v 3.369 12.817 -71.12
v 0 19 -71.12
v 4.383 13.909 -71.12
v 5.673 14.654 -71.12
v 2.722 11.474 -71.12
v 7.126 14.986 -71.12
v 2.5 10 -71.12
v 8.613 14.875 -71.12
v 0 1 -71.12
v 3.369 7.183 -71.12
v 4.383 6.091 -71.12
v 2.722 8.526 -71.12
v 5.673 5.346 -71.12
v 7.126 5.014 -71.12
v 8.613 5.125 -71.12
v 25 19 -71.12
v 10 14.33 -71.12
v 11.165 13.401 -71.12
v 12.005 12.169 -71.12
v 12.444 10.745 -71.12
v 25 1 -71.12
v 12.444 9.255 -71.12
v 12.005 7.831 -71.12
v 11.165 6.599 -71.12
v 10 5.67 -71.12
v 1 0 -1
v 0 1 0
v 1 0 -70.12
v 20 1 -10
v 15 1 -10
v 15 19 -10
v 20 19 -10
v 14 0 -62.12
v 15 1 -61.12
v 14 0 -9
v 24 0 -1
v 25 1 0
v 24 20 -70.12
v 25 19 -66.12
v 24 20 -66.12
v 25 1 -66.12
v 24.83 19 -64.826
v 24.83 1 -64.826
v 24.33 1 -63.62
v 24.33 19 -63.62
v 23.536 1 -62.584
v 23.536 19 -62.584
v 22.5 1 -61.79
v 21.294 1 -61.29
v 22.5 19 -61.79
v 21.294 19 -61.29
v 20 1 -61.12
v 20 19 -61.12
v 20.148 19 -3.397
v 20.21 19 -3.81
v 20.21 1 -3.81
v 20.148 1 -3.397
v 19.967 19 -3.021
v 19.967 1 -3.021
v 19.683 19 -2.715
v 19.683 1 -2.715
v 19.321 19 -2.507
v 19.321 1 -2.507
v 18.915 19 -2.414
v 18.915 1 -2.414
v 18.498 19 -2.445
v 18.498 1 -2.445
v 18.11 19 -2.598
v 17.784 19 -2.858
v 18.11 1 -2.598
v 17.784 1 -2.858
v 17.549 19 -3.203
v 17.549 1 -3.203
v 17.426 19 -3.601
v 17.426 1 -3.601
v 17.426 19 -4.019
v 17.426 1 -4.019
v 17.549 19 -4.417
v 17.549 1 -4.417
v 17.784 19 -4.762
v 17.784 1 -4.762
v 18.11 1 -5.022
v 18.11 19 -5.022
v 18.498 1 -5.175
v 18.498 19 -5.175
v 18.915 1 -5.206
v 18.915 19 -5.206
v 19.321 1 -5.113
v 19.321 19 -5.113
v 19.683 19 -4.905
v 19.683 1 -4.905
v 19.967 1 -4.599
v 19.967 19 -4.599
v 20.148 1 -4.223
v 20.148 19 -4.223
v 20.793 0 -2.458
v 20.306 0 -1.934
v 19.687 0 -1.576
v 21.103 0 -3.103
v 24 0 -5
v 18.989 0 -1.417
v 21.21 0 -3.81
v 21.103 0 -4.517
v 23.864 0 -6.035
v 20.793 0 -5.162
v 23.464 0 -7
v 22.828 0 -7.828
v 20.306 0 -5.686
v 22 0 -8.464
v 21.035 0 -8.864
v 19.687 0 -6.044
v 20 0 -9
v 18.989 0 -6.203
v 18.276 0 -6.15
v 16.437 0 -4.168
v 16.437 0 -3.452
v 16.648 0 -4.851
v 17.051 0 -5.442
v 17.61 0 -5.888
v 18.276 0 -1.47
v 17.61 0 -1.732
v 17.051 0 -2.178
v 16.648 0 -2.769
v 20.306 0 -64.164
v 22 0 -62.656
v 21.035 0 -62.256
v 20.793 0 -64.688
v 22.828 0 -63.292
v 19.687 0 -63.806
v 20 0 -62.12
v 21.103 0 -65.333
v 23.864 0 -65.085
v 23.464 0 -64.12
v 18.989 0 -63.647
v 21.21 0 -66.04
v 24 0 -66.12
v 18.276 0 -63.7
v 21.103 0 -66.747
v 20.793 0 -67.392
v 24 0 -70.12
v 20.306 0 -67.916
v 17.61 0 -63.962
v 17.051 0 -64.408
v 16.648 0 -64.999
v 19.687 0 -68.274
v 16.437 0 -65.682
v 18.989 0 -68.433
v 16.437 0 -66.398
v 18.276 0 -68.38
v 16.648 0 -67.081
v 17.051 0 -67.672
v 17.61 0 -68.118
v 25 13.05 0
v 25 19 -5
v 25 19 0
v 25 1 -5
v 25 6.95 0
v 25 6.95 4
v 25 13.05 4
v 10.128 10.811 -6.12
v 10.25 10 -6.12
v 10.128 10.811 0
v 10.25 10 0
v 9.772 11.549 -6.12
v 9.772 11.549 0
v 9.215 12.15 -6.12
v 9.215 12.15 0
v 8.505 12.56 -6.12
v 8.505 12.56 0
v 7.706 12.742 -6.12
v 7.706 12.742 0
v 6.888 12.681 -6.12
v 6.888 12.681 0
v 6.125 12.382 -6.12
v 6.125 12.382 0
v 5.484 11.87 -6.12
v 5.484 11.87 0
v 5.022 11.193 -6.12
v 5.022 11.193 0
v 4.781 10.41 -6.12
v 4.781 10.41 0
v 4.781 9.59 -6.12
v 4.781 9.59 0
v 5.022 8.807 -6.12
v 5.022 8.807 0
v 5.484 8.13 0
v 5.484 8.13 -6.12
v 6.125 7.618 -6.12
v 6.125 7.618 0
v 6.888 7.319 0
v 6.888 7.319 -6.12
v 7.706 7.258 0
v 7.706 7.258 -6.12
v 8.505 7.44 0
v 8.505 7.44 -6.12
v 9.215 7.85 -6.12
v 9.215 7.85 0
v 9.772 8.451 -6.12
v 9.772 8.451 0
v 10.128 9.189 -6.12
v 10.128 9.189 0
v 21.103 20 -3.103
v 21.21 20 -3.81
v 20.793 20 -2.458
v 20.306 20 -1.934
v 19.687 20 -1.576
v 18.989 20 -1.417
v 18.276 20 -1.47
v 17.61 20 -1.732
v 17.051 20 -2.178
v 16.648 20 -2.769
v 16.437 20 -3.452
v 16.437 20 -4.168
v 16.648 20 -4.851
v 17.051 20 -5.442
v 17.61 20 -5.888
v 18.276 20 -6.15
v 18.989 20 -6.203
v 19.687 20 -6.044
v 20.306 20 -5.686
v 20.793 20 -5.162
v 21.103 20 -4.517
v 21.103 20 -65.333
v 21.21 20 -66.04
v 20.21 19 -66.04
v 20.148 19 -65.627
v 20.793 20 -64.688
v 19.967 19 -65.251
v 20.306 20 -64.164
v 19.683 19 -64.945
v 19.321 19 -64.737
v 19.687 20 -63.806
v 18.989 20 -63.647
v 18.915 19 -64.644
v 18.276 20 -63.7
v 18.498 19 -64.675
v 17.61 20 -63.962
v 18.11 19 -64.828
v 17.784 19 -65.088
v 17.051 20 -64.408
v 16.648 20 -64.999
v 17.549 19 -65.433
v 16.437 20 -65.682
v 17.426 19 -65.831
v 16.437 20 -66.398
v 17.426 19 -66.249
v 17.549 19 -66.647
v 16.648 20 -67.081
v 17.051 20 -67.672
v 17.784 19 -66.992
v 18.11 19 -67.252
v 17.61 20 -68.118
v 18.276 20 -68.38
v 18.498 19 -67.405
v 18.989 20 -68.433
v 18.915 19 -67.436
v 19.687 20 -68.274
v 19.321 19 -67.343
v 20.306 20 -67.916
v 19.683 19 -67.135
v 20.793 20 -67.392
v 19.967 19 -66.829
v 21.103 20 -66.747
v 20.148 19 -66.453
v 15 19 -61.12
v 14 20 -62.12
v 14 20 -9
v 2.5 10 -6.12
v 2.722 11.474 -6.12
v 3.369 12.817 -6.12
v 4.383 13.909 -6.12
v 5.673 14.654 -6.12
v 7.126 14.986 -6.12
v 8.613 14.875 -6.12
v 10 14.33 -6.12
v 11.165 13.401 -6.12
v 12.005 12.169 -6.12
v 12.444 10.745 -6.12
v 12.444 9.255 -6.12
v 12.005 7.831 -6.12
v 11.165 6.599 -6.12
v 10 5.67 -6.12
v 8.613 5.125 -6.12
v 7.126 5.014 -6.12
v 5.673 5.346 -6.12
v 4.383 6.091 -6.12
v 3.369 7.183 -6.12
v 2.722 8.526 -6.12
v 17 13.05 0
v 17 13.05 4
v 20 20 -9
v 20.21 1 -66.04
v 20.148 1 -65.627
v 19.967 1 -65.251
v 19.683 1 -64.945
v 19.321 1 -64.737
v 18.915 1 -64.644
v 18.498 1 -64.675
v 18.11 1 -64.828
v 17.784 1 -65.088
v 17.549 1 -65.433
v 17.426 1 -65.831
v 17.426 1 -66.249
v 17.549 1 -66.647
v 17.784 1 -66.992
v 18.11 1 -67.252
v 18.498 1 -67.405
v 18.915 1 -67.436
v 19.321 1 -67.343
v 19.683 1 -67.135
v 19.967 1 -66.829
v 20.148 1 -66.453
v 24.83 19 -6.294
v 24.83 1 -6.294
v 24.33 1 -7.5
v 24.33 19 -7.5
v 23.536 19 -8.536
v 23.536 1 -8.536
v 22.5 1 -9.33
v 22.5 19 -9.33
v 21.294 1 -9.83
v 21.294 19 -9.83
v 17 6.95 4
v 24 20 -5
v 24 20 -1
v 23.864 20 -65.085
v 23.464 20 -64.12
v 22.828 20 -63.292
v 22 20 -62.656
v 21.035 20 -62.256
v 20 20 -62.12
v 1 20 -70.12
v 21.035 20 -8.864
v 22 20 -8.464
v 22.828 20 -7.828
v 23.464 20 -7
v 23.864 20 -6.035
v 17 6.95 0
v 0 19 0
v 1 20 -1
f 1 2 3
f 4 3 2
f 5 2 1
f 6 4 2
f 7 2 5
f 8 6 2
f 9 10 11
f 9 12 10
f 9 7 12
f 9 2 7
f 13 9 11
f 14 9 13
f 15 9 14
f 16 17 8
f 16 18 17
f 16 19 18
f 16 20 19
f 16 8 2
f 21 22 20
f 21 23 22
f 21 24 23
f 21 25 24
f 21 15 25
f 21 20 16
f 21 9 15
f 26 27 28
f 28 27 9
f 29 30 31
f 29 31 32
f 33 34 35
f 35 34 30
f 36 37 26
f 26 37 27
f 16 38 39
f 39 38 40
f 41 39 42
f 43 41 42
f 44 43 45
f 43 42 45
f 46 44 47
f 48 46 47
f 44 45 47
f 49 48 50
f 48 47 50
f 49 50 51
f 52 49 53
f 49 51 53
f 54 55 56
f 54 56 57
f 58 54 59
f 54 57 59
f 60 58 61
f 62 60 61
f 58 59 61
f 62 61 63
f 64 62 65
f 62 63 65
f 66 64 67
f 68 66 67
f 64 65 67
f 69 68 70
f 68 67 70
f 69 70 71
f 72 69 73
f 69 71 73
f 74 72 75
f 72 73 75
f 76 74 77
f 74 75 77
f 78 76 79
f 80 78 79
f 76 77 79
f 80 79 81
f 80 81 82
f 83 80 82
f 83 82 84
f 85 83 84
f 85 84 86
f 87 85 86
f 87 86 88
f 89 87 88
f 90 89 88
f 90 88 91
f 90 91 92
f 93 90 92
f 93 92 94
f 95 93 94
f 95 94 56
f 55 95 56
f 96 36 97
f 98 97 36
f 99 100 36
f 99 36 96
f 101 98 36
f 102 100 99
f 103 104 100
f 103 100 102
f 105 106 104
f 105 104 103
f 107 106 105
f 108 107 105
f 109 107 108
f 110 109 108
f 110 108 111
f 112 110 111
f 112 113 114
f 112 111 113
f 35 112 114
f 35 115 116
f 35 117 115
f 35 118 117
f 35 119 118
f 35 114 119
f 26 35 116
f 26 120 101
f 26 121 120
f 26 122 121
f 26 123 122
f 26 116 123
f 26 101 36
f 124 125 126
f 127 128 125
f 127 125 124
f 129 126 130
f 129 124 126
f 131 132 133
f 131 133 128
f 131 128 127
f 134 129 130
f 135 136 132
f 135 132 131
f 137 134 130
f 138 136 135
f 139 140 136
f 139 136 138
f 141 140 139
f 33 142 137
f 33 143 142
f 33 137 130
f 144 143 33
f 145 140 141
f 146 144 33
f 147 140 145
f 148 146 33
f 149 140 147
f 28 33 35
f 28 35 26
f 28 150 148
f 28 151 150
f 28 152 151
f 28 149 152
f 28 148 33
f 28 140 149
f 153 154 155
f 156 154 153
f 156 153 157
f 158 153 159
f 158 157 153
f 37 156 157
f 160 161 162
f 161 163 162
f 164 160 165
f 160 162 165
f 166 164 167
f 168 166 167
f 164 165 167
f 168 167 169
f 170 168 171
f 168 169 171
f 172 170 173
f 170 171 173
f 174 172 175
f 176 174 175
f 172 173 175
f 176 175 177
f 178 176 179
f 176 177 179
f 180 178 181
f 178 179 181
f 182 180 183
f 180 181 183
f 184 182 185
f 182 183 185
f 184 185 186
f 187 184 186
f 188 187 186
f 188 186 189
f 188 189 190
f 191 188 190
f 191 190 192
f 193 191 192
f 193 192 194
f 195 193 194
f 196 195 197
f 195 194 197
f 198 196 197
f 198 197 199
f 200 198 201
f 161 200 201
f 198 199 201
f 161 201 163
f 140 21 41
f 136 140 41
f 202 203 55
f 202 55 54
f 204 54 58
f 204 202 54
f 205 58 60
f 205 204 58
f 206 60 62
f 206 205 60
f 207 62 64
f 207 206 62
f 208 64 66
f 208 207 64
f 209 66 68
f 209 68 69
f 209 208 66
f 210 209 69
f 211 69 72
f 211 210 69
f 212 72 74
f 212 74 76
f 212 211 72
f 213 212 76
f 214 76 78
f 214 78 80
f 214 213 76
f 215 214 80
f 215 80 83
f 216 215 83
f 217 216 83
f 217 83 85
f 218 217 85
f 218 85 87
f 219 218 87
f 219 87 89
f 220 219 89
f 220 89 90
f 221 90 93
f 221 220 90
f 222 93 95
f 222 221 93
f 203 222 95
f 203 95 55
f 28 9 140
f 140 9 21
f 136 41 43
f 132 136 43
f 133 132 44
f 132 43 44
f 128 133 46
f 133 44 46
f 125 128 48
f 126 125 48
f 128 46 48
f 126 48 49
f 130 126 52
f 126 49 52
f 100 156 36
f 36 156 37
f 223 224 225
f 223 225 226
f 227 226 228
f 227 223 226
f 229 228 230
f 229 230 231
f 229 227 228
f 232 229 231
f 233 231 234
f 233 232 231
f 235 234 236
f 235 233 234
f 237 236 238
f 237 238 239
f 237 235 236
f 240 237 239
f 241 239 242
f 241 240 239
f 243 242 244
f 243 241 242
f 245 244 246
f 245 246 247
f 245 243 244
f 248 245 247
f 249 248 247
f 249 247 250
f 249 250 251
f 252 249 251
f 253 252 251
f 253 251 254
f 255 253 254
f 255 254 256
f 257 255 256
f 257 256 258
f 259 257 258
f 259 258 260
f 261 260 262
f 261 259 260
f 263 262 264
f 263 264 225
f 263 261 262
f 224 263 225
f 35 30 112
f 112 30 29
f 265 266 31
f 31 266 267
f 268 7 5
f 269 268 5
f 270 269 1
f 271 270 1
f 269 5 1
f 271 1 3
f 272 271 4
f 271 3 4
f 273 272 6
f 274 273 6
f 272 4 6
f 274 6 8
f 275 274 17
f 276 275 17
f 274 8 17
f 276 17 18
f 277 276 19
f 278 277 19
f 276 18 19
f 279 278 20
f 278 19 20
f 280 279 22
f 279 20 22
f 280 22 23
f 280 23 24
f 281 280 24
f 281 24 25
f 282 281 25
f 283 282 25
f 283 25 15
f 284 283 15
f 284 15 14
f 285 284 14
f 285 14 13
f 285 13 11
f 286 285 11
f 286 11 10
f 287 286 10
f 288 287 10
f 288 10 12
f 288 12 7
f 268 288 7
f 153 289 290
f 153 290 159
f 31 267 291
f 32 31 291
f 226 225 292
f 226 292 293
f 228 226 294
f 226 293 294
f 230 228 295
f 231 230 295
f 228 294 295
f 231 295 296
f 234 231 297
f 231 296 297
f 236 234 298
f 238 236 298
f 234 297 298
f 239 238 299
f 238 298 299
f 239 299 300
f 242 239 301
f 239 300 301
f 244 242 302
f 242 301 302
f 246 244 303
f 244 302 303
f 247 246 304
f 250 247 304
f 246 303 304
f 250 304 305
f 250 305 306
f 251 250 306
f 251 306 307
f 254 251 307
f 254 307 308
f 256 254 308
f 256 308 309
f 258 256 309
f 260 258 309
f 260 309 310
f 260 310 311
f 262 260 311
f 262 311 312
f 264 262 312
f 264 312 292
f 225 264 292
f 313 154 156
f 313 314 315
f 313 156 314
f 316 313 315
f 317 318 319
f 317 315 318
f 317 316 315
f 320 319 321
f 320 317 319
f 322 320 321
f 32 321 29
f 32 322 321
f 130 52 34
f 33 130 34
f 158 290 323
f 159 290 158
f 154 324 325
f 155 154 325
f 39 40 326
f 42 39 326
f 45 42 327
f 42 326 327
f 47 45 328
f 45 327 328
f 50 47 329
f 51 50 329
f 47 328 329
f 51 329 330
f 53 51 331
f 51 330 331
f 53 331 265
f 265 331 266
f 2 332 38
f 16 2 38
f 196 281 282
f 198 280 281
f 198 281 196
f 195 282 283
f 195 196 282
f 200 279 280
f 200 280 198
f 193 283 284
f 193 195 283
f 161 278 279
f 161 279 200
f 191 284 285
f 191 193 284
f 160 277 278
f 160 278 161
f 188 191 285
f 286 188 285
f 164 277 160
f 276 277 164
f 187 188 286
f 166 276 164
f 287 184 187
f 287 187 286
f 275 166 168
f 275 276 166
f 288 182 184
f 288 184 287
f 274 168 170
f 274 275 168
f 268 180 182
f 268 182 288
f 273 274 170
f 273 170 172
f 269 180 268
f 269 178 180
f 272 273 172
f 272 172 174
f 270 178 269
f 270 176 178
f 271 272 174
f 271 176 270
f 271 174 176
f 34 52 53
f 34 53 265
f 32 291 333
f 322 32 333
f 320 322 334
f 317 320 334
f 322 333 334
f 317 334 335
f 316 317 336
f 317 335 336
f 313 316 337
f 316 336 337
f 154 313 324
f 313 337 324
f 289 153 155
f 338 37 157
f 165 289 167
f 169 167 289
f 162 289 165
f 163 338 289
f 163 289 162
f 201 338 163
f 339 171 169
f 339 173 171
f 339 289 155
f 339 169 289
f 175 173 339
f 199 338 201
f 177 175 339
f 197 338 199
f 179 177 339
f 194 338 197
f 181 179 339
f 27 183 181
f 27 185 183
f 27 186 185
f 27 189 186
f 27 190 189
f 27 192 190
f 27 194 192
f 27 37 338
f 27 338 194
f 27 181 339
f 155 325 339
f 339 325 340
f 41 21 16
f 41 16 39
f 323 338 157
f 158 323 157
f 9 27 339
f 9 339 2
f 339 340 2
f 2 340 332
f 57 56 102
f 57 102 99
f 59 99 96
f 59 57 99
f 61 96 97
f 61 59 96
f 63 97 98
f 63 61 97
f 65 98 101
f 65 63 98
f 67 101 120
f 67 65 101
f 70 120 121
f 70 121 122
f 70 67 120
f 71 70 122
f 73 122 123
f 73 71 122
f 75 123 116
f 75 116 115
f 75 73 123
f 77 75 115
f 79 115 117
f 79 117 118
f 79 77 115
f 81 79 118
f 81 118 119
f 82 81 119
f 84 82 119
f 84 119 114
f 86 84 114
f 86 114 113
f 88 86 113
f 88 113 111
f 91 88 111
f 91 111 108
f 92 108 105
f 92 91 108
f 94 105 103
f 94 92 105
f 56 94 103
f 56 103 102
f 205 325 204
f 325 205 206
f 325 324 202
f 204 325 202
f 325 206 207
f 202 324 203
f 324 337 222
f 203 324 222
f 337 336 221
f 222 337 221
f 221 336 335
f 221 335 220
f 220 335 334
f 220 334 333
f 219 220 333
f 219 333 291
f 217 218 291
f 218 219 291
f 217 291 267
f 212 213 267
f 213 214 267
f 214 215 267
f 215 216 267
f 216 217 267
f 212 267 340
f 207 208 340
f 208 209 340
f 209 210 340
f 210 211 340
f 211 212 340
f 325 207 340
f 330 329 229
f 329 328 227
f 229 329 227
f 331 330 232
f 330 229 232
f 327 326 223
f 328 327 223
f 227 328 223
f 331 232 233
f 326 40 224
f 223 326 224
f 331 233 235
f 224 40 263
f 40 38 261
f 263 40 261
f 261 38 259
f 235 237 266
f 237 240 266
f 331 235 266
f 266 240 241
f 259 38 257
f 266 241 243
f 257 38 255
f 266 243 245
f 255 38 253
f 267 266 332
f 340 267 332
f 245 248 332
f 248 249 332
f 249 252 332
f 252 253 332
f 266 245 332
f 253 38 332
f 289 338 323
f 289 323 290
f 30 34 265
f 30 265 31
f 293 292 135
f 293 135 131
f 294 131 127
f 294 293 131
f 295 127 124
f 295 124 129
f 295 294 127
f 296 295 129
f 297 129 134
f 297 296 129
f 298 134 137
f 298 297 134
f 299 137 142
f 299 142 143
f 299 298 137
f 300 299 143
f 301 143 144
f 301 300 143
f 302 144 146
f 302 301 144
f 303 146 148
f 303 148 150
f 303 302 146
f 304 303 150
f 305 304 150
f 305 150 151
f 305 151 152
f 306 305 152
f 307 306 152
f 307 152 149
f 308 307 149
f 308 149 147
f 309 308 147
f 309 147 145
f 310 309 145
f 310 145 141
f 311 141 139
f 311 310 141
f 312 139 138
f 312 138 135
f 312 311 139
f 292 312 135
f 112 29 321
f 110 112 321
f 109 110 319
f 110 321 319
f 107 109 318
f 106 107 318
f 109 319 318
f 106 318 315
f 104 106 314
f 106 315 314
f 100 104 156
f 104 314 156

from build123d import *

# Parameters (mm, degrees)
BOSS_EXTRUDE1_DEPTH            = 20
CBORE_FOR_M5_SHCS1_D           = 5.5
CBORE_FOR_M5_SHCS1_CBORE_D     = 10
CBORE_FOR_M5_SHCS1_CBORE_DEPTH = 65
SKETCH5_W                      = 8
SKETCH5_H                      = 6.1
BOSS_EXTRUDE2_DEPTH            = 4
SKETCH6_R                      = 1.4
CUT_EXTRUDE1_DEPTH             = 21
FILLET1_R                      = 5
CHAMFER2_SIZE                  = 1


with BuildPart() as part:
    # Sketch1 → Boss-Extrude1 (new body)
    with BuildSketch(Plane(origin=(0, 0, 0), x_dir=(1, 0, 0), z_dir=(0, 1, 0))):
        Polygon((0, 0), (0, 71.12), (25, 71.12), (25, 61.12), (15, 61.12), (15, 10), (25, 10), (25, 0), align=None)
    extrude(amount=BOSS_EXTRUDE1_DEPTH)

    # CBORE for M5 SHCS1 (through all)
    with Locations(Plane(origin=(0, 0, -71.12), x_dir=(-1, 0, 0), z_dir=(0, 0, -1))):
        with Locations((-7.5, 10)):
            CounterBoreHole(CBORE_FOR_M5_SHCS1_D / 2, CBORE_FOR_M5_SHCS1_CBORE_D / 2, CBORE_FOR_M5_SHCS1_CBORE_DEPTH)

    # Sketch5 → Boss-Extrude2 (add)
    with BuildSketch(Plane.XY):
        with Locations((21, 10)):
            Rectangle(SKETCH5_W, SKETCH5_H)
    extrude(amount=BOSS_EXTRUDE2_DEPTH)

    # Sketch6 → Cut-Extrude1 (cut, through all)
    with BuildSketch(Plane.XZ):
        with Locations((18.81, -3.81)):
            Circle(SKETCH6_R)
        with Locations((18.81, -66.04)):
            Circle(SKETCH6_R)
    extrude(amount=-CUT_EXTRUDE1_DEPTH, mode=Mode.SUBTRACT)

    # Fillet1
    fillet1_edges = [part.edges().sort_by_distance(p)[0] for p in [
        (25, 10, -61.12),
        (25, 10, -10),
    ]]
    fillet(fillet1_edges, radius=FILLET1_R)

    # Chamfer2
    chamfer2_edges = [part.edges().sort_by_distance(p)[0] for p in [
        (15, 0, -35.56),
        (25, 0, -2.5),
        (12.5, 0, 0),
        (15, 20, -35.56),
        (17.5, 20, -61.12),
        (12.5, 20, -71.12),
        (0, 20, -35.56),
        (17.41, 20, -3.81),
        (17.41, 0, -3.81),
        (17.41, 20, -66.04),
        (17.41, 0, -66.04),
        (12.5, 20, 0),
        (17.5, 0, -10),
        (17.5, 20, -10),
        (25, 0, -68.62),
        (23.535533906, 0, -62.584466094),
        (23.535533906, 0, -8.535533906),
        (25, 20, -68.62),
        (23.535533906, 20, -62.584466094),
        (23.535533906, 20, -8.535533906),
        (0, 0, -35.56),
        (25, 20, -2.5),
        (12.5, 0, -71.12),
        (17.5, 0, -61.12),
    ]]
    chamfer(chamfer2_edges, length=CHAMFER2_SIZE)


solid = part.part
